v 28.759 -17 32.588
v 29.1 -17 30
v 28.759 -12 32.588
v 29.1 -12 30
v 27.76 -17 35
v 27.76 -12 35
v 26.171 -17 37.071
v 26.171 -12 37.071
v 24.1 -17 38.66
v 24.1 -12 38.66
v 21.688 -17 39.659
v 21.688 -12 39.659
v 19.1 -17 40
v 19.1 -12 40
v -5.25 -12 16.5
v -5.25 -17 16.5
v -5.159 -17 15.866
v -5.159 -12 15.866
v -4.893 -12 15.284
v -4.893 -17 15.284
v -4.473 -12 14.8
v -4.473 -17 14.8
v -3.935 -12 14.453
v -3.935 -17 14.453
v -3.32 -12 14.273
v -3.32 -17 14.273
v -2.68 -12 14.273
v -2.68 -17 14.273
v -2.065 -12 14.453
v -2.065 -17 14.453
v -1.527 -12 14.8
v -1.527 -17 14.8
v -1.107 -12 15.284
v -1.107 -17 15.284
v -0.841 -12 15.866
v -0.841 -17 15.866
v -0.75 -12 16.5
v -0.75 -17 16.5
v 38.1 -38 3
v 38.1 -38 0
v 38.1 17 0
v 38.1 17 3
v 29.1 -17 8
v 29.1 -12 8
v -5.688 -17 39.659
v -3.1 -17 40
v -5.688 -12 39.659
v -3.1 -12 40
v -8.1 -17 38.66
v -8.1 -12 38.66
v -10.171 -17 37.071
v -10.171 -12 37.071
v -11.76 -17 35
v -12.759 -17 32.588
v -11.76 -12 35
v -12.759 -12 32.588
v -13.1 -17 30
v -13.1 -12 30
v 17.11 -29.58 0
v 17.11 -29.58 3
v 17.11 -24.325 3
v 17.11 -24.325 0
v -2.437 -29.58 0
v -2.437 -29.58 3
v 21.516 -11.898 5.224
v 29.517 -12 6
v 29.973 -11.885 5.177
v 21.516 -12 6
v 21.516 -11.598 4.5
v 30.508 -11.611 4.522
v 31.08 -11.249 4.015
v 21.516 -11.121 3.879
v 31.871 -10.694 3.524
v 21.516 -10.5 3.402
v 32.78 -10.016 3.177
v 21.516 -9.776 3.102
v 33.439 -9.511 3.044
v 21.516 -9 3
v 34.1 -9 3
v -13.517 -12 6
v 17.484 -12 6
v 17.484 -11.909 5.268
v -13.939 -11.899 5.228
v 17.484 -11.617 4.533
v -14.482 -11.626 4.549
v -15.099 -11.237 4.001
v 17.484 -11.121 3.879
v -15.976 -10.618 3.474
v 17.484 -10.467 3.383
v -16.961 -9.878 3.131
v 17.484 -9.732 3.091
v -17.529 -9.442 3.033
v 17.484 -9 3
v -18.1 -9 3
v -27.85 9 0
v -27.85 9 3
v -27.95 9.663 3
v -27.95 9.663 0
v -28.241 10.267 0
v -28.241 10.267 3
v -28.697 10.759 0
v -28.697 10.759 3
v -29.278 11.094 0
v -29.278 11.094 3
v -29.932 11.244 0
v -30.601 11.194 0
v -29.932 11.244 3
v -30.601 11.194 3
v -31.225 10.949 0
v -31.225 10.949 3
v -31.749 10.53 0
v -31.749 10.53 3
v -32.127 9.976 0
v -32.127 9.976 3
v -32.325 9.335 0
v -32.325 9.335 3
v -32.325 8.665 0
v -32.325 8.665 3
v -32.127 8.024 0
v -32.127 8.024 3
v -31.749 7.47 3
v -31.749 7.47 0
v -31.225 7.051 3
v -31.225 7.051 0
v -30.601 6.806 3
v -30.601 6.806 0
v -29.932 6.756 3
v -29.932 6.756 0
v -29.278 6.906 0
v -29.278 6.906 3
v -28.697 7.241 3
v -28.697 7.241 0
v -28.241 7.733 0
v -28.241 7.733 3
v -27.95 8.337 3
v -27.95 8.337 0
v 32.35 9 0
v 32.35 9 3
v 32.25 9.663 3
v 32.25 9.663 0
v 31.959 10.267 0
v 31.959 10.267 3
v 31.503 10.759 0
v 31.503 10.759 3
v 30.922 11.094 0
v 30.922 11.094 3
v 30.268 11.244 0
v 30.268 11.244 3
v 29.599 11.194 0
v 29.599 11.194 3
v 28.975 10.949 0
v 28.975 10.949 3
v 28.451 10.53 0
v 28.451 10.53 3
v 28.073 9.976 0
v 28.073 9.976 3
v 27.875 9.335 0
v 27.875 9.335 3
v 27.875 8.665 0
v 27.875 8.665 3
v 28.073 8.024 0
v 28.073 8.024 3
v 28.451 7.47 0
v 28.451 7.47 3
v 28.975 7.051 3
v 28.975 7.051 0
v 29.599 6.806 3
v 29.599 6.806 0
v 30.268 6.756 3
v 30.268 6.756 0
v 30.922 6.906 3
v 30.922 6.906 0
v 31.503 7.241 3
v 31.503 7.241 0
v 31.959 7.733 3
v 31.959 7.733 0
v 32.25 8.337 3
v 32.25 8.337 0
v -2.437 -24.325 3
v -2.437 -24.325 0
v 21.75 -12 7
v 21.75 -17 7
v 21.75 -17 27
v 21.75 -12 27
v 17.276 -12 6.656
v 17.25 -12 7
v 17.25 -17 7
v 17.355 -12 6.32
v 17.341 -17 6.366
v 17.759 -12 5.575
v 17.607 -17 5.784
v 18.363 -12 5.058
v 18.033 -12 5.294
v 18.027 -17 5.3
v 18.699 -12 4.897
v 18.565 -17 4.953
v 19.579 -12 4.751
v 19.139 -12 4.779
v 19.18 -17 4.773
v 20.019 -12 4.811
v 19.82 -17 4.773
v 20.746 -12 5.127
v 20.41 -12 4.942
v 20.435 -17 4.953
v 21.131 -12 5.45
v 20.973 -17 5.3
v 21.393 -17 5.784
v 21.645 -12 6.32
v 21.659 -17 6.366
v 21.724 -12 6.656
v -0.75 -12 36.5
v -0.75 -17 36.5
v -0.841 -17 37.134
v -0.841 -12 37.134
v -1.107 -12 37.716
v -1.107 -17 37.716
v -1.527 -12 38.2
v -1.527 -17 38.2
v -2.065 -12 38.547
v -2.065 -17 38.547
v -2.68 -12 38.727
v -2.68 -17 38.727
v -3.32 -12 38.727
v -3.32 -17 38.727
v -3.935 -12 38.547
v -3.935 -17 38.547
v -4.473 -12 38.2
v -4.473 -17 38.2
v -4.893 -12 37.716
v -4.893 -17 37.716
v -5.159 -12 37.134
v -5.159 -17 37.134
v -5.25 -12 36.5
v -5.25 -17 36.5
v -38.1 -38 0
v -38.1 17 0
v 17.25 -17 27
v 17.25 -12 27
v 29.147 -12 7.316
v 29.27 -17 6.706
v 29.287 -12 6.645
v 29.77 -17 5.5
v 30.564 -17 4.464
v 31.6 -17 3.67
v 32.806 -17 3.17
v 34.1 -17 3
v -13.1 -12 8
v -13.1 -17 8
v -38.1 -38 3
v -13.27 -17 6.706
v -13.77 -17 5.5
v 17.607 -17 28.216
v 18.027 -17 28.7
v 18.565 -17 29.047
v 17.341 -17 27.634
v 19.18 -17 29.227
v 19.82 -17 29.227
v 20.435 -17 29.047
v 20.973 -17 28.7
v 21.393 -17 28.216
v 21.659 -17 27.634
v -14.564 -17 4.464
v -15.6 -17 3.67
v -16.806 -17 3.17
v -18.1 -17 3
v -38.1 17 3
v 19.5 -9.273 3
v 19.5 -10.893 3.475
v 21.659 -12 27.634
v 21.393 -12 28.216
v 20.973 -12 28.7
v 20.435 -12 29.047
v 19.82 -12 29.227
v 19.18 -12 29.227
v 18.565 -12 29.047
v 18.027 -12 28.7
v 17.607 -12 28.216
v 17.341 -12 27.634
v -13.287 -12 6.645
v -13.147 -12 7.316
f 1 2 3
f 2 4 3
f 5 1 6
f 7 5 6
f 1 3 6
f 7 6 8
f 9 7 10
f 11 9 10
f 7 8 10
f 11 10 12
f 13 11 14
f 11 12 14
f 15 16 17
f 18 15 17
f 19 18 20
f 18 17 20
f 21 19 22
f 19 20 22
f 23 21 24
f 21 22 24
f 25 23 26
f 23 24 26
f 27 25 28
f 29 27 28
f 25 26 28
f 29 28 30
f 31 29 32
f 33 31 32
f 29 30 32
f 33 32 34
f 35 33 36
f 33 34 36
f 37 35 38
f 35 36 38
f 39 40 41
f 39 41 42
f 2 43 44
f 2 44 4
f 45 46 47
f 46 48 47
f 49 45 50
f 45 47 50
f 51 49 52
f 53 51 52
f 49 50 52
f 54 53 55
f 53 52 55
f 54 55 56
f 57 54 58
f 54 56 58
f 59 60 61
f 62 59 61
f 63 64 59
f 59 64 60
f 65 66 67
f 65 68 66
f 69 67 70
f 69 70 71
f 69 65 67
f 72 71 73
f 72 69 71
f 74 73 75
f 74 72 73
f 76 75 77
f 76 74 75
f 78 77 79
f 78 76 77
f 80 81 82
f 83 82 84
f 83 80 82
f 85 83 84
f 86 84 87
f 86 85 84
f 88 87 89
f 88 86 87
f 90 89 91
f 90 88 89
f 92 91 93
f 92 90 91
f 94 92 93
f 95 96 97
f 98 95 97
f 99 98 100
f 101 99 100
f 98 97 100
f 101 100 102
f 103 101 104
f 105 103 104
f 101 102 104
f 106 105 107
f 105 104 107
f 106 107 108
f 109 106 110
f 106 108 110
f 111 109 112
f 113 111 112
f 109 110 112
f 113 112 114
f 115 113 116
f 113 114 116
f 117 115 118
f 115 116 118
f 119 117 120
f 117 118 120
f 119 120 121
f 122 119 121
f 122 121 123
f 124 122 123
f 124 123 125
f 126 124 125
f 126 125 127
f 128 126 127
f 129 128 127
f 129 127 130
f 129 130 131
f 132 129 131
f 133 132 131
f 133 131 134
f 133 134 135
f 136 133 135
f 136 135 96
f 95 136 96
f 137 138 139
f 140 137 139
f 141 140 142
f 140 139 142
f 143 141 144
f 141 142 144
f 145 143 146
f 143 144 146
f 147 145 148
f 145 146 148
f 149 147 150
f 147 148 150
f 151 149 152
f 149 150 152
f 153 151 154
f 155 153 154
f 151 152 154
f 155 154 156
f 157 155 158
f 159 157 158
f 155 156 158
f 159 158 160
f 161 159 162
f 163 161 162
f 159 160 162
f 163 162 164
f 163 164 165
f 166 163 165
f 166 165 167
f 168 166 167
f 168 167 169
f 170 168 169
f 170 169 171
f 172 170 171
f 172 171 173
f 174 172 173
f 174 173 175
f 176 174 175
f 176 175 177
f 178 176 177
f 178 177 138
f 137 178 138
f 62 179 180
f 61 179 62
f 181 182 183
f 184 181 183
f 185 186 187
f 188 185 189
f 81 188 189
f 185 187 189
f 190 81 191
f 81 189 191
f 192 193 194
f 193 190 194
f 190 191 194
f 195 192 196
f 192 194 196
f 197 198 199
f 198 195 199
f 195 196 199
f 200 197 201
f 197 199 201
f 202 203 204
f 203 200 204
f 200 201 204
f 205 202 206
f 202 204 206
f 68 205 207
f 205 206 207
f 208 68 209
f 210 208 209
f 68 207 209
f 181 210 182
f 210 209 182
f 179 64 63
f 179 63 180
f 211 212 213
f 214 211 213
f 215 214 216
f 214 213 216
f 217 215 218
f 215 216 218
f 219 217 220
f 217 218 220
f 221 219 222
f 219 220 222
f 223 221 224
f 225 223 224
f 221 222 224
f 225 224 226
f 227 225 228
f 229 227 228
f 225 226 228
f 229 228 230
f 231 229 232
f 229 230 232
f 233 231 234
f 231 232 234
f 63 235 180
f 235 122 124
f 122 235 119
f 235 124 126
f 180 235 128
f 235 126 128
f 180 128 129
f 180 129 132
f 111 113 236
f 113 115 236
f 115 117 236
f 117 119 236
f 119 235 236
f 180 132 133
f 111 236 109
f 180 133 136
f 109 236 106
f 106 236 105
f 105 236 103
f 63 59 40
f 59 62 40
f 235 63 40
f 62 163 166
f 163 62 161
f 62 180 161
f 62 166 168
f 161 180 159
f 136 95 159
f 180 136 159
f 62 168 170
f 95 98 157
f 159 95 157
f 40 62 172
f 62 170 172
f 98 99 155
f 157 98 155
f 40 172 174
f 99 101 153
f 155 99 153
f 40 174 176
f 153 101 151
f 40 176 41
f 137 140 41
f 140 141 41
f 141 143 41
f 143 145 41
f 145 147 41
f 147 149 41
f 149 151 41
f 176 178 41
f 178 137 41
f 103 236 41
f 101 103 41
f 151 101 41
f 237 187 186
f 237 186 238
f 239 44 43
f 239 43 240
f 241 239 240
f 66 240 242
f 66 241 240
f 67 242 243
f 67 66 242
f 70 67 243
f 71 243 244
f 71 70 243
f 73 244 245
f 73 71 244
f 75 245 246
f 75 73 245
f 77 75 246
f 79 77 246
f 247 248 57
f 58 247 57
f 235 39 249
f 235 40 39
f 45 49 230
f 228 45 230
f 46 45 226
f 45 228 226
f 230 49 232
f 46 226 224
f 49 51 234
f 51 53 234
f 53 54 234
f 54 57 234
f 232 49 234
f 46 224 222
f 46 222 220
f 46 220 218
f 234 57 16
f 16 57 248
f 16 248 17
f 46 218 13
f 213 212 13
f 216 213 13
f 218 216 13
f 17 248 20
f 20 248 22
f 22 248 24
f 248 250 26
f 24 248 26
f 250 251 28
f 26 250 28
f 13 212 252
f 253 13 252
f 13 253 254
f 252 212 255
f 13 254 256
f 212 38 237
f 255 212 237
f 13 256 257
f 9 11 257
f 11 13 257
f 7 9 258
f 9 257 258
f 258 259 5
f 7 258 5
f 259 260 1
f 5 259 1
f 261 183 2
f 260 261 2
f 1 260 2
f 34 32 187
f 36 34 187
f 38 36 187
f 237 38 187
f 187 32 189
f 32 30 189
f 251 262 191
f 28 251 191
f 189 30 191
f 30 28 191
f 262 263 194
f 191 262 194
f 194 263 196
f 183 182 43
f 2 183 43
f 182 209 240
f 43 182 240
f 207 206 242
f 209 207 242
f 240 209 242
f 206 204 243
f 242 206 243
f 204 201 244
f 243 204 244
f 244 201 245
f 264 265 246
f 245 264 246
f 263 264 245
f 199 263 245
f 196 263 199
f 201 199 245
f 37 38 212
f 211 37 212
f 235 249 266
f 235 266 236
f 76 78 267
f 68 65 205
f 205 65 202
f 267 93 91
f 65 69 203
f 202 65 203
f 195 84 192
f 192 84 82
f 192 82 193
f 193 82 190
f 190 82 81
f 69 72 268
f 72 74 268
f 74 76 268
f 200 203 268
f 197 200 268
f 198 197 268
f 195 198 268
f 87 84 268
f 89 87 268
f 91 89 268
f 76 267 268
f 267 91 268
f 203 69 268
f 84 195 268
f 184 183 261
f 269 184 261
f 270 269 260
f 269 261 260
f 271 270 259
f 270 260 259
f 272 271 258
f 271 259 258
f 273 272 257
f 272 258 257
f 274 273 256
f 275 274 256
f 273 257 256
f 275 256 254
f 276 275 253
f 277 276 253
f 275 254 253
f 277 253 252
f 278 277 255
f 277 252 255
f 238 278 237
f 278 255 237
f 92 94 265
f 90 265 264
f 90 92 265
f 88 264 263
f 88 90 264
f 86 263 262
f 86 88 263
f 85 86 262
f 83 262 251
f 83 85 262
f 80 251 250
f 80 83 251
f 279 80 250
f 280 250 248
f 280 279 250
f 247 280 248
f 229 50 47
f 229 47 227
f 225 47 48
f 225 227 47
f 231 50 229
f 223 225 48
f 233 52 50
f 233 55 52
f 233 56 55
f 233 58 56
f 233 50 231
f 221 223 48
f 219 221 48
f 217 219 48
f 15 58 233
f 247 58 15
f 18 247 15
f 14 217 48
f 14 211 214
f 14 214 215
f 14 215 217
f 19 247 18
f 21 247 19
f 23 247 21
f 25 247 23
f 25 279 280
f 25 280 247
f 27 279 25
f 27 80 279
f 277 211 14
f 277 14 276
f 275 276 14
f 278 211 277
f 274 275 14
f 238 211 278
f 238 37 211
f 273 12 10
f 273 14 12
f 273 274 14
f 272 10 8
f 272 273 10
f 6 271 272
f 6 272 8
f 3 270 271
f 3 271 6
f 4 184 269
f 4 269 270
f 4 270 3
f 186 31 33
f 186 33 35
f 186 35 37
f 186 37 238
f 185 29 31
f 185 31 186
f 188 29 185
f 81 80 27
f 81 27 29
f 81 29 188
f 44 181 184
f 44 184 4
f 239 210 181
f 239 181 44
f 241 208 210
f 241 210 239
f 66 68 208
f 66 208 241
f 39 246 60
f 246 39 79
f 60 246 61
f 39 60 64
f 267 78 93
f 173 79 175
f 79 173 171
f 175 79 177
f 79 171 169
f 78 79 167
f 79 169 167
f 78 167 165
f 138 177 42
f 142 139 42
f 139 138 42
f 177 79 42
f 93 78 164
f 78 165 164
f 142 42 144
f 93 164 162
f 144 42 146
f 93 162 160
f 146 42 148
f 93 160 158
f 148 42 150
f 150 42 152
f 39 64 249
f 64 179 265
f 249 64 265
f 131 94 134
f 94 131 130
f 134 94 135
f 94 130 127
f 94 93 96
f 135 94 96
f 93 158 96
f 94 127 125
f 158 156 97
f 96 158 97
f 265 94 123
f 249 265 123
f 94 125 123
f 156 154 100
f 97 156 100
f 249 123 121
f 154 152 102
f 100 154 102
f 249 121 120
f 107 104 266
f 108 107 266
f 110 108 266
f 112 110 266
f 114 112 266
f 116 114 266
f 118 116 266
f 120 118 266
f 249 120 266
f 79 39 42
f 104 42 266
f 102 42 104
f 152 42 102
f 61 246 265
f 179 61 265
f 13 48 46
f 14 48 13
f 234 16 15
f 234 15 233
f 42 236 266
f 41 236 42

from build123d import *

# Parameters (mm, degrees)
SKETCH_W        = 76.2
SKETCH_H        = 34
PAD_DEPTH       = 3
SKETCH001_R     = 2.25
POCKET_DEPTH    = 3.001
SKETCH002_W     = 76.2
SKETCH002_H     = 5
PAD001_DEPTH    = 37
POCKET001_DEPTH = 34.001
SKETCH004_W     = 25
SKETCH004_H     = 37
SKETCH004_W_2   = 9
POCKET002_DEPTH = 34.001
FILLET_R        = 10
FILLET001_R     = 5
FILLET002_R     = 3
PAD002_DEPTH    = 21
SKETCH005_W     = 19.546381
SKETCH005_H     = 5.254696
POCKET003_DEPTH = 3.001


with BuildPart() as part:
    # Sketch → Pad (new body)
    with BuildSketch(Plane.XY):
        Rectangle(SKETCH_W, SKETCH_H)
    extrude(amount=PAD_DEPTH)

    # Sketch001 (on Face6 of Pad) → Pocket (cut, through all)
    with BuildSketch(Plane.XY.offset(3)):
        with Locations((-30.1, 9)):
            Circle(SKETCH001_R)
        with Locations((30.1, 9)):
            Circle(SKETCH001_R)
    extrude(amount=-POCKET_DEPTH, mode=Mode.SUBTRACT)

    # Sketch002 (on Face5 of Pocket) → Pad001 (join)
    with BuildSketch(Plane.XY.offset(3)):
        with Locations((0, -14.5)):
            Rectangle(SKETCH002_W, SKETCH002_H)
    extrude(amount=PAD001_DEPTH)

    # Sketch003 (on Face12 of Pad001) → Pocket001 (cut, through all)
    with BuildSketch(Plane.XZ.offset(17)):
        with BuildLine():
            ThreePointArc((-5.25, 16.5), (-3, 14.25), (-0.75, 16.5))
            Line((-0.75, 16.5), (-0.75, 36.5))
            ThreePointArc((-0.75, 36.5), (-3, 38.75), (-5.25, 36.5))
            Line((-5.25, 16.5), (-5.25, 36.5))
        make_face()
        with BuildLine():
            ThreePointArc((17.25, 7), (19.5, 4.75), (21.75, 7))
            Line((21.75, 7), (21.75, 27))
            ThreePointArc((21.75, 27), (19.5, 29.25), (17.25, 27))
            Line((17.25, 7), (17.25, 27))
        make_face()
    extrude(amount=-POCKET001_DEPTH, mode=Mode.SUBTRACT)

    # Sketch004 (on Face12 of Pocket001) → Pocket002 (cut, through all)
    with BuildSketch(Plane.XZ.offset(17)):
        with Locations((-25.6, 21.5)):
            Rectangle(SKETCH004_W, SKETCH004_H)
        with Locations((33.6, 21.5)):
            Rectangle(SKETCH004_W_2, SKETCH004_H)
    extrude(amount=-POCKET002_DEPTH, mode=Mode.SUBTRACT)

    # Fillet
    fillet_edges = [part.edges().sort_by_distance(p)[0] for p in [
        (-13.1, -14.5, 40),
        (29.1, -14.5, 40),
    ]]
    fillet(fillet_edges, radius=FILLET_R)

    # Fillet001
    fillet001_edges = [part.edges().sort_by_distance(p)[0] for p in [
        (-13.1, -14.5, 3),
        (29.1, -14.5, 3),
    ]]
    fillet(fillet001_edges, radius=FILLET001_R)

    # Fillet002
    fillet002_edges = [part.edges().sort_by_distance(p)[0] for p in [
        (8, -12, 3),
    ]]
    fillet(fillet002_edges, radius=FILLET002_R)

    # Fillet002 Face31 → Pad002 (add)
    with BuildSketch(Plane(origin=(0, -17, 1.5), x_dir=(-1, 0, 0), z_dir=(0, -1, 0))):
        Polygon((-38.1, -1.5), (-34.1, -1.5), (-29.1, -1.5), (13.1, -1.5), (18.1, -1.5), (38.1, -1.5), (38.1, 1.5), (-38.1, 1.5), align=None)
    extrude(amount=PAD002_DEPTH)

    # Sketch005 (on Face29 of Pad002) → Pocket003 (cut, through all)
    with BuildSketch(Plane.XY.offset(3)):
        with Locations((7.336419, -26.952593)):
            Rectangle(SKETCH005_W, SKETCH005_H)
    extrude(amount=-POCKET003_DEPTH, mode=Mode.SUBTRACT)


solid = part.part
